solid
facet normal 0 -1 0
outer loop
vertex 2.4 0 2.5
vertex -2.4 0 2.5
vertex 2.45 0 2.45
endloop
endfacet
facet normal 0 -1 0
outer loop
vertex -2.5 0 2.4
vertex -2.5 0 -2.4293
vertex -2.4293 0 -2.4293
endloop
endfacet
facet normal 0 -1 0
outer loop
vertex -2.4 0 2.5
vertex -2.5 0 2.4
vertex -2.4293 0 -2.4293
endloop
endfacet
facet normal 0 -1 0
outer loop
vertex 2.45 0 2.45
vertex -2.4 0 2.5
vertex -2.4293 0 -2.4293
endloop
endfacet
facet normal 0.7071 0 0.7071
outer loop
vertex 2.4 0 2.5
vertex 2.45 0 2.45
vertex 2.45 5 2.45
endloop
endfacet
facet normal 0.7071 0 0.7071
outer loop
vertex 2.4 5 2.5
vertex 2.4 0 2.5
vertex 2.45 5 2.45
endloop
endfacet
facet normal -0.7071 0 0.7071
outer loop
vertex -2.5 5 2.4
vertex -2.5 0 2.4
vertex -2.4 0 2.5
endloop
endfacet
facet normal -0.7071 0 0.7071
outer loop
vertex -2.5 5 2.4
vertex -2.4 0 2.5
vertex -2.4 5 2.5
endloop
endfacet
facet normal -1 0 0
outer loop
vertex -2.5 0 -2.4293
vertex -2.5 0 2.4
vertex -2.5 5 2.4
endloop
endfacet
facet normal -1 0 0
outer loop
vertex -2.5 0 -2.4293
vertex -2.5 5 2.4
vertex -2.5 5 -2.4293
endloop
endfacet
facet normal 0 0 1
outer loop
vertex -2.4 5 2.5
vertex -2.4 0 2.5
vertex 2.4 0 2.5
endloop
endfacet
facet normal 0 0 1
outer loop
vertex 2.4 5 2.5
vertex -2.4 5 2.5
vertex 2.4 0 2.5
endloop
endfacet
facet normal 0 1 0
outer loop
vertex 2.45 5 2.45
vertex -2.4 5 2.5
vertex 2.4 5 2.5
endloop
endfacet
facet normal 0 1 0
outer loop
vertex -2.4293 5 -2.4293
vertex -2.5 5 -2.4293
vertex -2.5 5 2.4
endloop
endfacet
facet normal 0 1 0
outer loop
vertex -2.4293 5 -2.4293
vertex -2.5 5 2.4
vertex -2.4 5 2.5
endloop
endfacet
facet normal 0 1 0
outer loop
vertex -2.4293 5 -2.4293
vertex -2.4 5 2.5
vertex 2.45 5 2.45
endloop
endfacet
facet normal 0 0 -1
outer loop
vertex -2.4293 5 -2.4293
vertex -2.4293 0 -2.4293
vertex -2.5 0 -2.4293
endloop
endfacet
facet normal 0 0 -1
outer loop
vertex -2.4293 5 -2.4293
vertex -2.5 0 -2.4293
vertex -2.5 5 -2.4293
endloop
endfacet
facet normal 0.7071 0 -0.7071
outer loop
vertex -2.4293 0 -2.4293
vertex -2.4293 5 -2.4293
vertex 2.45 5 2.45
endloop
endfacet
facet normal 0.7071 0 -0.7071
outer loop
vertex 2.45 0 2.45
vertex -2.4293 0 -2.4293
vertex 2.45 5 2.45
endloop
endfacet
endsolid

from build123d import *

# Parameters (mm, degrees)
SKETCH_1_W             = 5
SKETCH_1_H             = 5
EXTRUDE_1_DEPTH        = 5
CUT_EXTRUDE_1_DEPTH    = 5
CHAMFER_1_SIZE2        = 0.070710678
CHAMFER_1_SIZE         = 0.1
CHAMFER_1_EDGE_2_SIZE  = 0.1
CHAMFER_1_EDGE_3_SIZE2 = 0.1
CHAMFER_1_EDGE_3_SIZE  = 0.070710678


with BuildPart() as part:
    # 草图1 → 凸台-拉伸1 (new body)
    with BuildSketch(Plane(origin=(0, 0, 0), x_dir=(1, 0, 0), z_dir=(0, 1, 0))):
        Rectangle(SKETCH_1_W, SKETCH_1_H)
    extrude(amount=EXTRUDE_1_DEPTH)

    # 草图2 → 切除-拉伸1 (cut)
    with BuildSketch(Plane(origin=(0, 5, 0), x_dir=(1, 0, 0), z_dir=(0, 1, 0))):
        Polygon((-2.5, 2.5), (2.5, -2.5), (2.5, 2.5), align=None)
    extrude(amount=-CUT_EXTRUDE_1_DEPTH, mode=Mode.SUBTRACT)

    # 倒角1
    chamfer_1_edges = [part.edges().sort_by_distance(p)[0] for p in [
        (2.5, 2.5, 2.5),
    ]]
    chamfer(chamfer_1_edges, length=CHAMFER_1_SIZE, length2=CHAMFER_1_SIZE2)

    # 倒角1 edge 2
    chamfer_1_edge_2_edges = [part.edges().sort_by_distance(p)[0] for p in [
        (-2.5, 2.5, 2.5),
    ]]
    chamfer(chamfer_1_edge_2_edges, length=CHAMFER_1_EDGE_2_SIZE)

    # 倒角1 edge 3
    chamfer_1_edge_3_edges = [part.edges().sort_by_distance(p)[0] for p in [
        (-2.5, 2.5, -2.5),
    ]]
    chamfer(chamfer_1_edge_3_edges, length=CHAMFER_1_EDGE_3_SIZE, length2=CHAMFER_1_EDGE_3_SIZE2)


solid = part.part
